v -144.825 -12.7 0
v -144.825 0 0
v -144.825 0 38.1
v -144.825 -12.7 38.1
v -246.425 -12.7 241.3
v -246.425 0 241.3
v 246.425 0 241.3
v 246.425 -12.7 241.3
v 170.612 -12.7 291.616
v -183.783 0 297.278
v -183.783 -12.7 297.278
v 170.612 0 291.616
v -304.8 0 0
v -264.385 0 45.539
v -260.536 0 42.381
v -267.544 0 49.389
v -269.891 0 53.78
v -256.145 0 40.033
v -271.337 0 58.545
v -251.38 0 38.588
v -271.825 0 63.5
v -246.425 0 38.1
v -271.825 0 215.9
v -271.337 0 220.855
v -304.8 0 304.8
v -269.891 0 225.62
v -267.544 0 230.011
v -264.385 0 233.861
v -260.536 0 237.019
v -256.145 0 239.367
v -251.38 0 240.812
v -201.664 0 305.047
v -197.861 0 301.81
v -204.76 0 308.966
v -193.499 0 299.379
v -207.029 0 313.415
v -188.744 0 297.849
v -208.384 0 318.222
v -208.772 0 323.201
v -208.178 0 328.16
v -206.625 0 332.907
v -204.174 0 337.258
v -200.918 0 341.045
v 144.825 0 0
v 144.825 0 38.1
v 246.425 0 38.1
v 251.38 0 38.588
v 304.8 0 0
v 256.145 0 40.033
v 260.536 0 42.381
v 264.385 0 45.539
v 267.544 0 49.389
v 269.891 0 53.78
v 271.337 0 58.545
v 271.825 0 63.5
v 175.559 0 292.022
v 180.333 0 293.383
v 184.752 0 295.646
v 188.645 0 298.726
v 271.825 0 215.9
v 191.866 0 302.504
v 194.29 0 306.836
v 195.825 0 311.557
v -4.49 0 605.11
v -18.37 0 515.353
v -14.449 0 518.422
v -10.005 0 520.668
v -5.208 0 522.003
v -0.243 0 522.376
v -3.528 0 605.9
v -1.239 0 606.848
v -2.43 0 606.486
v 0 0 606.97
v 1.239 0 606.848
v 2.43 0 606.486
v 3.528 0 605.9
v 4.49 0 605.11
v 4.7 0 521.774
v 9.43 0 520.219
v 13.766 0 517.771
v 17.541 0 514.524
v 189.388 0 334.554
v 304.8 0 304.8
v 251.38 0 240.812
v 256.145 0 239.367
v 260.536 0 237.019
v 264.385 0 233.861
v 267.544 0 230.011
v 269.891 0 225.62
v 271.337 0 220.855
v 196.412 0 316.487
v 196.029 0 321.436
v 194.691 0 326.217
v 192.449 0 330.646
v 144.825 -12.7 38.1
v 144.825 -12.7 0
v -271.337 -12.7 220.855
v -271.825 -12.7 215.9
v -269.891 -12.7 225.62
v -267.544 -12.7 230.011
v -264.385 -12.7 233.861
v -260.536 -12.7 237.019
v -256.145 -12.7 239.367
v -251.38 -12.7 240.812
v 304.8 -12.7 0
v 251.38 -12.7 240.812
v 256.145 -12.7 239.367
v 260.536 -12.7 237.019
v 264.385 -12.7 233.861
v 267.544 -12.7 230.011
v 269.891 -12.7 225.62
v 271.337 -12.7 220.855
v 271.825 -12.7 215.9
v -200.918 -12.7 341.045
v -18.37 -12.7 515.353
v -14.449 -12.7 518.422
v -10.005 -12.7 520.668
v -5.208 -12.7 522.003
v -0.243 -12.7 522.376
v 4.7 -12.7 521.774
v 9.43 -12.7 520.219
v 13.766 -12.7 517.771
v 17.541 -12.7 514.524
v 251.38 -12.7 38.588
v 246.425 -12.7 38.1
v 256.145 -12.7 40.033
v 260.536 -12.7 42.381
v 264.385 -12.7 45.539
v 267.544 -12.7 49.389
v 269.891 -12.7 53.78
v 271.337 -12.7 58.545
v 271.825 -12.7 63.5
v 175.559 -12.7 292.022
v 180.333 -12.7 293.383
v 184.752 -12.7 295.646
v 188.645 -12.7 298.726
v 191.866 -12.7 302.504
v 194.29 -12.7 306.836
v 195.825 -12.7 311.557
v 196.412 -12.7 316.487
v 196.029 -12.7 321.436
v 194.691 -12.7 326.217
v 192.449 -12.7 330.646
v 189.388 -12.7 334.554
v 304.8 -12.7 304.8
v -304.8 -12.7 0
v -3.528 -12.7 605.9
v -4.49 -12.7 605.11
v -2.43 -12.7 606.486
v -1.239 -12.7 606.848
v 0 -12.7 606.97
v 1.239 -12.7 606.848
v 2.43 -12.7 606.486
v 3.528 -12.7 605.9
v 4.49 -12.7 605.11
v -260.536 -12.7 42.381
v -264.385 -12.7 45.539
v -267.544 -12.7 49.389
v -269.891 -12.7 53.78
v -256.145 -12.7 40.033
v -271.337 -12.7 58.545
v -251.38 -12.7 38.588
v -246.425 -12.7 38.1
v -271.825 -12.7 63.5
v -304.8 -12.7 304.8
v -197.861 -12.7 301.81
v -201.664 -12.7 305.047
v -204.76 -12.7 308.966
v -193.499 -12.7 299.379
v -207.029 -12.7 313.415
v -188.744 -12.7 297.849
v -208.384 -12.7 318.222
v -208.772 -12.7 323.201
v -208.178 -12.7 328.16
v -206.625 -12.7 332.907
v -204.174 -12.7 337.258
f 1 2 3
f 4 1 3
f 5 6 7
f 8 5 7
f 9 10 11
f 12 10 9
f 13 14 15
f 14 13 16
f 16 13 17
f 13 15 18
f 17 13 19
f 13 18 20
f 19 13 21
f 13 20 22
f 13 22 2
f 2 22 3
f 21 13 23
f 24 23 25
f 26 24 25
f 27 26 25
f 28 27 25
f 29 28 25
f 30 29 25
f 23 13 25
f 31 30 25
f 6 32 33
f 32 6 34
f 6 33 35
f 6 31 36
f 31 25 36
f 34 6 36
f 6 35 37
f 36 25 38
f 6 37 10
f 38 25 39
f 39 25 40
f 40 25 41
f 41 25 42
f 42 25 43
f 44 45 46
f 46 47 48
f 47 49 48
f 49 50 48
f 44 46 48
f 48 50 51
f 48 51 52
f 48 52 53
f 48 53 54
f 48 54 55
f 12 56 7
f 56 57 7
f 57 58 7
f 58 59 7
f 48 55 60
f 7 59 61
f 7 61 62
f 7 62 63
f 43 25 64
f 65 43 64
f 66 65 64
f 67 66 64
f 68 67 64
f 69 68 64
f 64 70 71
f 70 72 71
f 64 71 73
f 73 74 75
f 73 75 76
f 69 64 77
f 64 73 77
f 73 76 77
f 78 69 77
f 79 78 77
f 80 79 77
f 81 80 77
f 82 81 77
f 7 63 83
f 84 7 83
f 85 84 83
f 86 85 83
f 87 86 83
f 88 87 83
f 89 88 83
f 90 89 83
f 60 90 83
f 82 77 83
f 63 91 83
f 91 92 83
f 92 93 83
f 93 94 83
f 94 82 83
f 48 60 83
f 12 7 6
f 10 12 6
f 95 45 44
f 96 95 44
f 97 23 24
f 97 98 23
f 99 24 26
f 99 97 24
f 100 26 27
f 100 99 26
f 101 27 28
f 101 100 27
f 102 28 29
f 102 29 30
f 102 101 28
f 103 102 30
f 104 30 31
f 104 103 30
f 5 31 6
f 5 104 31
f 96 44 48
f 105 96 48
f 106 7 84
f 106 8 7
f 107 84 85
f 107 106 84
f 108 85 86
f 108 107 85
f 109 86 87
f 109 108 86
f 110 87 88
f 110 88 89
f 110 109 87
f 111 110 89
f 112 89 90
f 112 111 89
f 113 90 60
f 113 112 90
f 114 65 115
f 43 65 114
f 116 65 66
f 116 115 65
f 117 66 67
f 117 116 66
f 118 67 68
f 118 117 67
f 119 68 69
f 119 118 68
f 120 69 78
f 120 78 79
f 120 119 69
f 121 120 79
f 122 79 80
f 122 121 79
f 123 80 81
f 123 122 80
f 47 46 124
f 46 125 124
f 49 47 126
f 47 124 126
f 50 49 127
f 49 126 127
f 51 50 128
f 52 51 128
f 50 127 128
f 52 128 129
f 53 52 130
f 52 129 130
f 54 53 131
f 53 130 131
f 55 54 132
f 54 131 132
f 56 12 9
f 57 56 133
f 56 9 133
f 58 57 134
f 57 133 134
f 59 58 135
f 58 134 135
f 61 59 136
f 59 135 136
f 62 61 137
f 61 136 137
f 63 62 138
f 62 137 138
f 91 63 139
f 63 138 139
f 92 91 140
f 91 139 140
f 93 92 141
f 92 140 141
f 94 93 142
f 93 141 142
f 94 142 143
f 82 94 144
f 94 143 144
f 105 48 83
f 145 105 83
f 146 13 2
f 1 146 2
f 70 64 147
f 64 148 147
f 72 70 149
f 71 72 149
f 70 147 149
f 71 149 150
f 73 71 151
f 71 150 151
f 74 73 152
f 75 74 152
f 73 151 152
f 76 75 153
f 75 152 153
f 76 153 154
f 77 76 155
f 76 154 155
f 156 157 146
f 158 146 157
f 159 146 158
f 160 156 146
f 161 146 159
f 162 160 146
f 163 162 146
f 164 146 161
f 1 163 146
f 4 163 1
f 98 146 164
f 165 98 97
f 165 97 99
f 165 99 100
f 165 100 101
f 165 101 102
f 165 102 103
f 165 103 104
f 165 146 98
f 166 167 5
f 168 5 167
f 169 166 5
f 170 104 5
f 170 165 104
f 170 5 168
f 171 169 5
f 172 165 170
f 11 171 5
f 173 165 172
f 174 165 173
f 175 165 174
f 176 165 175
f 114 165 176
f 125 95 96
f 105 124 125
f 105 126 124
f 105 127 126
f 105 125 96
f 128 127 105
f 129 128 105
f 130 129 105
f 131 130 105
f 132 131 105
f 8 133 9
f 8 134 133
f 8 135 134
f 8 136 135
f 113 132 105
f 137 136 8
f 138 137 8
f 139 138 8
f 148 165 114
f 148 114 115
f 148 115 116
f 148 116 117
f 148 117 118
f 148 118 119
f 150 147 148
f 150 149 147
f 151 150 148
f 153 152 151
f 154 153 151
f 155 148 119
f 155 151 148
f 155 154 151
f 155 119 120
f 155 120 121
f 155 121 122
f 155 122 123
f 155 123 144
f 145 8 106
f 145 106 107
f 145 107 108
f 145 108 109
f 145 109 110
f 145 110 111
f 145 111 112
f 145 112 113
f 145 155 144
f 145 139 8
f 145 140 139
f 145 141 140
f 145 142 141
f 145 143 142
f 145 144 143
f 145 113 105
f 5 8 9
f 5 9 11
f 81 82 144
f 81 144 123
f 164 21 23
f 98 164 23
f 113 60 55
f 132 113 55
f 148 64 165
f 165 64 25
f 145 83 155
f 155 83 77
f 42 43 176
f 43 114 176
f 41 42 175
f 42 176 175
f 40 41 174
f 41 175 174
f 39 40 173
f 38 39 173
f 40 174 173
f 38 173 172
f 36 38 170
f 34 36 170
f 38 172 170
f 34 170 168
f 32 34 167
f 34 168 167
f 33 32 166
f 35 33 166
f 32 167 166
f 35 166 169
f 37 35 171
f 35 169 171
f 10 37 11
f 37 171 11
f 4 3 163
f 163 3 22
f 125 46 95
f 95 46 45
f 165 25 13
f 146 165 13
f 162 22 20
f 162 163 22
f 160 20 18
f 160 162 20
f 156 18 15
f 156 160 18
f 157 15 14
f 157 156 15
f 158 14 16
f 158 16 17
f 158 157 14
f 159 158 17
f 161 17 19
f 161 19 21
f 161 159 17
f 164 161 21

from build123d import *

# Parameters (mm, degrees)
F1_DEPTH = 12.7
F3_DEPTH = 12.701
F4_R     = 6.35
F5_R     = 25.4


with BuildPart() as f1:
    # F0 (on Front) → F1 (new body)
    with BuildSketch(Plane.XZ):
        Polygon((-304.8, 304.8), (-304.8, 0), (-144.824734, 0), (-144.824734, 38.1), (-271.824734, 38.1), (-271.824734, 241.3), (0, 241.3), (271.824734, 241.3), (271.824734, 38.1), (144.824734, 38.1), (144.824734, 0), (304.8, 0), (304.8, 304.8), (0, 609.6), align=None)
    extrude(amount=F1_DEPTH)

    # F2 (on Front) → F3 (cut, through all)
    with BuildSketch(Plane.XZ):
        Polygon((0, 532.894433), (-245.717928, 298.267931), (231.313556, 290.646062), align=None)
    extrude(amount=F3_DEPTH, mode=Mode.SUBTRACT)

    # F4
    f4_edges = [f1.edges().sort_by_distance(p)[0] for p in [
        (0, -6.35, 609.6),
    ]]
    fillet(f4_edges, radius=F4_R)

    # F5
    f5_edges = [f1.edges().sort_by_distance(p)[0] for p in [
        (-271.824734, -6.35, 38.1),
        (-271.824734, -6.35, 241.3),
        (271.824734, -6.35, 241.3),
        (271.824734, -6.35, 38.1),
        (-245.717928, -6.35, 298.267931),
        (231.313556, -6.35, 290.646062),
        (0, -6.35, 532.894433),
    ]]
    fillet(f5_edges, radius=F5_R)


solid = f1.part
